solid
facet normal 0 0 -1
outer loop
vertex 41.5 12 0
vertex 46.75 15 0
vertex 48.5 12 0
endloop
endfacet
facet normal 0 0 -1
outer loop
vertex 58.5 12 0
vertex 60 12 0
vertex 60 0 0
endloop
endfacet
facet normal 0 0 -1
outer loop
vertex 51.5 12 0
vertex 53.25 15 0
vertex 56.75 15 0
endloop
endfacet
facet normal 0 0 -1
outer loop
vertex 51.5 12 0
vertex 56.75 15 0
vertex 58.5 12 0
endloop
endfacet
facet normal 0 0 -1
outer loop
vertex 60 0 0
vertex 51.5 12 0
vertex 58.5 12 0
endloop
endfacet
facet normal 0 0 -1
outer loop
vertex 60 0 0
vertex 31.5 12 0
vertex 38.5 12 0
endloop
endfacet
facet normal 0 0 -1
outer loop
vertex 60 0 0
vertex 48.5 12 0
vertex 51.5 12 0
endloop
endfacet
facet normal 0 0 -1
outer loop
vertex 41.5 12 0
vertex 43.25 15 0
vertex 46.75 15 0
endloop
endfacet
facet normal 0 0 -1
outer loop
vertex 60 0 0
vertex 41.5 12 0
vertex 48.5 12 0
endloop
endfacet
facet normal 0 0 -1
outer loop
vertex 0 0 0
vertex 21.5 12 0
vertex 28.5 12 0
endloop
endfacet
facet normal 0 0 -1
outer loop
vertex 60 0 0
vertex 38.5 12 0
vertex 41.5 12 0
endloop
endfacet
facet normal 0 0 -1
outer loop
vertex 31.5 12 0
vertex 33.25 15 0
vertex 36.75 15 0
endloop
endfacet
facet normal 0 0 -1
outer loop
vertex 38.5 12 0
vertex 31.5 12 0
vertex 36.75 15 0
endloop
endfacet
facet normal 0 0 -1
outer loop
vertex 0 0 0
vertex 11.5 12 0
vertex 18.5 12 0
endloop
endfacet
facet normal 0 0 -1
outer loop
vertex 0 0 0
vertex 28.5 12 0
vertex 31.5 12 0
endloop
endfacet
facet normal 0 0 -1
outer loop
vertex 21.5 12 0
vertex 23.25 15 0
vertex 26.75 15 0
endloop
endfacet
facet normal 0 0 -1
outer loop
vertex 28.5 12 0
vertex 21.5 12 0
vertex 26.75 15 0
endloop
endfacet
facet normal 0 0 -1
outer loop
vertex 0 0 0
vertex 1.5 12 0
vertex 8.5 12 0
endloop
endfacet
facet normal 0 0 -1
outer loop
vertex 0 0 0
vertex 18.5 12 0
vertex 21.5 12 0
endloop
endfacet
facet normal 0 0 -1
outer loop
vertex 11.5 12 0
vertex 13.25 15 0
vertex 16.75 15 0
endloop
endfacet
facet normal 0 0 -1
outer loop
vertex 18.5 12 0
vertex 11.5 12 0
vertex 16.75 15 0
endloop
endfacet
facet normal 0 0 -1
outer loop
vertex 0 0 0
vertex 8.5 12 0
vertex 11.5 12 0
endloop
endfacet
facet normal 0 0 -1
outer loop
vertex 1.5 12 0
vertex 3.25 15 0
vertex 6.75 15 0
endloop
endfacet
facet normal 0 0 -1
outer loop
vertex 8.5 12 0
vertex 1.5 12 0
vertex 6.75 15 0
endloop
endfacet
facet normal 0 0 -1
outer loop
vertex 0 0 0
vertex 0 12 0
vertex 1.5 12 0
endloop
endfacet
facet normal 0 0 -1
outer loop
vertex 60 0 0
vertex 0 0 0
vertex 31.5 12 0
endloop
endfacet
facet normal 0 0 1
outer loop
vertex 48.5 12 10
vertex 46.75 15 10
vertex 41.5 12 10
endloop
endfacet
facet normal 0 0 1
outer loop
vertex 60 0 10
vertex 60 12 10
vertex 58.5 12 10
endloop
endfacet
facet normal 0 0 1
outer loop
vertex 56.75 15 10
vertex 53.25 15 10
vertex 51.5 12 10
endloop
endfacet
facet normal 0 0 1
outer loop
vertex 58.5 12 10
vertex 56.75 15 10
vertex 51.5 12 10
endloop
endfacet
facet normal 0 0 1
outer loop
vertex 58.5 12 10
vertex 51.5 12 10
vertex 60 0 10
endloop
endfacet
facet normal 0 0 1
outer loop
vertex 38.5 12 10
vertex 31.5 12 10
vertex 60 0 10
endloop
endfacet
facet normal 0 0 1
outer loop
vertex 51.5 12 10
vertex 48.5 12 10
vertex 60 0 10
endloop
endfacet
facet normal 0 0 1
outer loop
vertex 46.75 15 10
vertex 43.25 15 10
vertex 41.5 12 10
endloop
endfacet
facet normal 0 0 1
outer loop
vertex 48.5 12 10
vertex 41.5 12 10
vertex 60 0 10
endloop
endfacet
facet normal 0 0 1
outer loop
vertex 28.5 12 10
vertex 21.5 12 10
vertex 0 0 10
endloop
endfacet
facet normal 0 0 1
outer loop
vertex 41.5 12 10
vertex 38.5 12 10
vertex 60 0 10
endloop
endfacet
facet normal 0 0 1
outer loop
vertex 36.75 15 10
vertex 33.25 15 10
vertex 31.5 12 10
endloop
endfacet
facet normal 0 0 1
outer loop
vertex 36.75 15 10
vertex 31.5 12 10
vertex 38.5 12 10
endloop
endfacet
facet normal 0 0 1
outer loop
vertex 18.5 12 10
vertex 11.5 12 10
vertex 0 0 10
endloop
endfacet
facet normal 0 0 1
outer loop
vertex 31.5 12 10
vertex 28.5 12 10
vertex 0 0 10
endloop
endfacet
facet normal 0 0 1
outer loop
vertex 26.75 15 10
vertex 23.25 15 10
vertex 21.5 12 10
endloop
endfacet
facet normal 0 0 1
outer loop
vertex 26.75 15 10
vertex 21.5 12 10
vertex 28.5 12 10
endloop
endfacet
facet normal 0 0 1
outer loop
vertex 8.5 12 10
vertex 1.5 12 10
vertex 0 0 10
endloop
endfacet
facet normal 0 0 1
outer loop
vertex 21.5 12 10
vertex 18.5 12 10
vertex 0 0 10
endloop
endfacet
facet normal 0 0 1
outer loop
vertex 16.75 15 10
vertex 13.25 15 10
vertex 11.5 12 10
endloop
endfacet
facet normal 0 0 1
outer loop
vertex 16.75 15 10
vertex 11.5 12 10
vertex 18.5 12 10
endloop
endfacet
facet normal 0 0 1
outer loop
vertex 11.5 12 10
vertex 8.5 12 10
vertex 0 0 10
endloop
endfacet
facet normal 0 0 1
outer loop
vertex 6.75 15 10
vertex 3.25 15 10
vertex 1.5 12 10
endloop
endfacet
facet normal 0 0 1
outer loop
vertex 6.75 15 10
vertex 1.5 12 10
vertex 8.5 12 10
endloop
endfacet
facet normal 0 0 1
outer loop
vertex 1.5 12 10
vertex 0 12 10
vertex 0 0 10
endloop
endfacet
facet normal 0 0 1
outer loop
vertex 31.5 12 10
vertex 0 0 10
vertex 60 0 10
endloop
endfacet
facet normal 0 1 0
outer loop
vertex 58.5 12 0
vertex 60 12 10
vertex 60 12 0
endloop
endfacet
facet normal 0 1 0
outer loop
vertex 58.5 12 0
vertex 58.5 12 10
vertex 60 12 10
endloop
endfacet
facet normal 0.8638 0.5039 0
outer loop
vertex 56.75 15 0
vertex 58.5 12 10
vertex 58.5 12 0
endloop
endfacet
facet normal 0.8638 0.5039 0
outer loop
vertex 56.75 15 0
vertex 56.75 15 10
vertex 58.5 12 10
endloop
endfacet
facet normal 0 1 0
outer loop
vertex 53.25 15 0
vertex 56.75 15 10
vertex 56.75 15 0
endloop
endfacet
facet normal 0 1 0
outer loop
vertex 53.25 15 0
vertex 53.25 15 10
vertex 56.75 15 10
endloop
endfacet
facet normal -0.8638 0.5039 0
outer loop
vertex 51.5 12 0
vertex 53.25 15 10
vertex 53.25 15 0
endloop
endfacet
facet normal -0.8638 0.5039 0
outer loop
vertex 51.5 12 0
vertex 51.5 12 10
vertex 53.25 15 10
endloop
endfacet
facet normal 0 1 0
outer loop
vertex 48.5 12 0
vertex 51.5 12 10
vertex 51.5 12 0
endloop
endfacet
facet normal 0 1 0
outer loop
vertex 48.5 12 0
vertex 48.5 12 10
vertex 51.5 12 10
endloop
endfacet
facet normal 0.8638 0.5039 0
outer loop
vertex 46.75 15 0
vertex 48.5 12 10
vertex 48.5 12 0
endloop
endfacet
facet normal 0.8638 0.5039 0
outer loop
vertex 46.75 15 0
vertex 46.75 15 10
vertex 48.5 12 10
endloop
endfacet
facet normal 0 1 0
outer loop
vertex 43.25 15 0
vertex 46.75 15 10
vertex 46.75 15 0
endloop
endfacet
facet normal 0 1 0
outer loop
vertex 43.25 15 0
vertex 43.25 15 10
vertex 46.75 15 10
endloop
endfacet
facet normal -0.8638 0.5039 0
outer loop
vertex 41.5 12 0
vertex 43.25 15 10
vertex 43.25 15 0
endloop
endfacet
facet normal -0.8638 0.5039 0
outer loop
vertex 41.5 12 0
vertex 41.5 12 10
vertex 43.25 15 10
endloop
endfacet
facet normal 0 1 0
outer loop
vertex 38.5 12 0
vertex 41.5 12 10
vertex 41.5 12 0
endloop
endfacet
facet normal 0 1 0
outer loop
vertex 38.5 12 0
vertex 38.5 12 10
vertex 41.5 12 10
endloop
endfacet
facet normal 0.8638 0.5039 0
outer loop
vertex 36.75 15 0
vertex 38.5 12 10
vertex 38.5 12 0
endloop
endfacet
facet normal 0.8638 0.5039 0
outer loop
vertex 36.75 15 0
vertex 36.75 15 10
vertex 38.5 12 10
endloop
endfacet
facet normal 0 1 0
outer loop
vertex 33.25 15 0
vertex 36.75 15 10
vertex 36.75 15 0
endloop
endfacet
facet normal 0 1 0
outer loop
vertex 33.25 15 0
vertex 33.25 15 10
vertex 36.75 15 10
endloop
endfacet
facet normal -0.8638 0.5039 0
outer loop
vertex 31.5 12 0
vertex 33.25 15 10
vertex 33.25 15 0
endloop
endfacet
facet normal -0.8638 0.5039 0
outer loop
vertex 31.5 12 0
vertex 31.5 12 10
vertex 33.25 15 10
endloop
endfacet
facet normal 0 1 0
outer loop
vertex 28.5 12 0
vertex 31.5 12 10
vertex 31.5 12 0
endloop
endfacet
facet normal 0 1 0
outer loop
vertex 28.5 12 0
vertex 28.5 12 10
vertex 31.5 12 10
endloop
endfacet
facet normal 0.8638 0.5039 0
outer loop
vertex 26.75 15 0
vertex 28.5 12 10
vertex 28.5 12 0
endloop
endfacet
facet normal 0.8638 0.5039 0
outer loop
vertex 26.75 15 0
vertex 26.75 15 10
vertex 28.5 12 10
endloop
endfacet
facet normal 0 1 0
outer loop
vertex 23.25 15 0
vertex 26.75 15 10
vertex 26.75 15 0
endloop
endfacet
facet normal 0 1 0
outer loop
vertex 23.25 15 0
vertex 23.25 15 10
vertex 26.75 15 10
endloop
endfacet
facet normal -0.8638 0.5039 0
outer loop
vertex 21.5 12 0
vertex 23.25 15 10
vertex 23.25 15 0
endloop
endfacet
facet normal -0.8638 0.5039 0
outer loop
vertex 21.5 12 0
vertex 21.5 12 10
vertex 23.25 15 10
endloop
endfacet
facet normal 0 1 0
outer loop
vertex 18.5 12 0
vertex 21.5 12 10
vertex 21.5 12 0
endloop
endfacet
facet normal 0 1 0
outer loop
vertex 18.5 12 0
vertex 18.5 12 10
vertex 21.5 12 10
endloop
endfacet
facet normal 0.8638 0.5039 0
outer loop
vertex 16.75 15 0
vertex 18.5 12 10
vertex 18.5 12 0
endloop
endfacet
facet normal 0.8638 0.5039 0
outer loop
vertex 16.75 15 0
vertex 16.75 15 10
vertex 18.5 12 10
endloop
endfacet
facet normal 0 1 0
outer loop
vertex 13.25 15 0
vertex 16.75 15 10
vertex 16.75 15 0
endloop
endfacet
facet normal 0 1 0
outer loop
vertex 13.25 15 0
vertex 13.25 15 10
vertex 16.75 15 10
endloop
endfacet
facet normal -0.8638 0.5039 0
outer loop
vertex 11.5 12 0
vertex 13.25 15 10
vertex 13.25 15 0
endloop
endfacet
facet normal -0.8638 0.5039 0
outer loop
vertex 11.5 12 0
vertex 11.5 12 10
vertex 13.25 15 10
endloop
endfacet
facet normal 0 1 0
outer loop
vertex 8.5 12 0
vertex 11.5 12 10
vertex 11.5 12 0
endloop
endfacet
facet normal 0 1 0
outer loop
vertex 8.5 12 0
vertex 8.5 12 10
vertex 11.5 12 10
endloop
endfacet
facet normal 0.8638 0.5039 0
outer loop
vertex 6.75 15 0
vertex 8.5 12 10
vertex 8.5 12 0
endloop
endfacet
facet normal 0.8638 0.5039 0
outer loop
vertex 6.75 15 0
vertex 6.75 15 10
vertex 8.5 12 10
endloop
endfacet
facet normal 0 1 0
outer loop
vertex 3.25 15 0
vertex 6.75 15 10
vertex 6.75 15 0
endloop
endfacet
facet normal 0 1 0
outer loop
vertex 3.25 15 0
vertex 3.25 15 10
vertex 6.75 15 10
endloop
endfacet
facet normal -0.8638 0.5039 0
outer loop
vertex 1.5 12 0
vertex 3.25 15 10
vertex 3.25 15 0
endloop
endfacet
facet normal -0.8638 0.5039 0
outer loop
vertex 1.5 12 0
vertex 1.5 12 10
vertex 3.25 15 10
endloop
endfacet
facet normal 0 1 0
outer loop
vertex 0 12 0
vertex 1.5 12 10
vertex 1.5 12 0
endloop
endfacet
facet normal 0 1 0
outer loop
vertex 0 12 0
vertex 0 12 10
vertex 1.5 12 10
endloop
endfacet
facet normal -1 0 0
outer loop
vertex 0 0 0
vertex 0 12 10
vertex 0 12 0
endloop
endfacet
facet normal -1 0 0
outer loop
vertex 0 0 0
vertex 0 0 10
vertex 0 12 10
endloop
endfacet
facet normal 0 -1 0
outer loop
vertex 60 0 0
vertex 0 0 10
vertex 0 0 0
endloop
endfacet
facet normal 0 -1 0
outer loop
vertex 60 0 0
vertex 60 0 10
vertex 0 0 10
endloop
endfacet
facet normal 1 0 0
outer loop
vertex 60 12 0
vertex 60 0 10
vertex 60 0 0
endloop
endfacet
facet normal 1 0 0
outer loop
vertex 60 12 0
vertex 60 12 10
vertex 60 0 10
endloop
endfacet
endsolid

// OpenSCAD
$fn = 32;

// ----------------------------------------------------------------------
// Gear rack: 6 teeth, pitch 10 mm
// ----------------------------------------------------------------------

// --- parameters (mm) ---
teeth = 6;                // number of teeth
pitch = 10;               // tooth pitch, X
root_w = 7;               // tooth width at the root
tip_w = 3.5;              // tooth width at the tip
base_h = 12;              // rack body height, Y
tooth_h = 3;              // tooth height above the body
plate_t = 10;             // rack width, Z (extrusion height)
fit_tol = 0.02;           // declared fit tolerance (prompt contract)
free_tol = 0.2;           // declared free tolerance (prompt contract)

rack_l = teeth * pitch;  // overall length
total_h = base_h + tooth_h;  // overall height

profile = [[0, 0], [60, 0], [60, 12], [58.5, 12], [56.75, 15], [53.25, 15], [51.5, 12], [48.5, 12], [46.75, 15], [43.25, 15], [41.5, 12], [38.5, 12], [36.75, 15], [33.25, 15], [31.5, 12], [28.5, 12], [26.75, 15], [23.25, 15], [21.5, 12], [18.5, 12], [16.75, 15], [13.25, 15], [11.5, 12], [8.5, 12], [6.75, 15], [3.25, 15], [1.5, 12], [0, 12]];  // primary outline, 28 points, counter clockwise

// --- the one profile operation ---
linear_extrude(height = plate_t) polygon(points = profile);
